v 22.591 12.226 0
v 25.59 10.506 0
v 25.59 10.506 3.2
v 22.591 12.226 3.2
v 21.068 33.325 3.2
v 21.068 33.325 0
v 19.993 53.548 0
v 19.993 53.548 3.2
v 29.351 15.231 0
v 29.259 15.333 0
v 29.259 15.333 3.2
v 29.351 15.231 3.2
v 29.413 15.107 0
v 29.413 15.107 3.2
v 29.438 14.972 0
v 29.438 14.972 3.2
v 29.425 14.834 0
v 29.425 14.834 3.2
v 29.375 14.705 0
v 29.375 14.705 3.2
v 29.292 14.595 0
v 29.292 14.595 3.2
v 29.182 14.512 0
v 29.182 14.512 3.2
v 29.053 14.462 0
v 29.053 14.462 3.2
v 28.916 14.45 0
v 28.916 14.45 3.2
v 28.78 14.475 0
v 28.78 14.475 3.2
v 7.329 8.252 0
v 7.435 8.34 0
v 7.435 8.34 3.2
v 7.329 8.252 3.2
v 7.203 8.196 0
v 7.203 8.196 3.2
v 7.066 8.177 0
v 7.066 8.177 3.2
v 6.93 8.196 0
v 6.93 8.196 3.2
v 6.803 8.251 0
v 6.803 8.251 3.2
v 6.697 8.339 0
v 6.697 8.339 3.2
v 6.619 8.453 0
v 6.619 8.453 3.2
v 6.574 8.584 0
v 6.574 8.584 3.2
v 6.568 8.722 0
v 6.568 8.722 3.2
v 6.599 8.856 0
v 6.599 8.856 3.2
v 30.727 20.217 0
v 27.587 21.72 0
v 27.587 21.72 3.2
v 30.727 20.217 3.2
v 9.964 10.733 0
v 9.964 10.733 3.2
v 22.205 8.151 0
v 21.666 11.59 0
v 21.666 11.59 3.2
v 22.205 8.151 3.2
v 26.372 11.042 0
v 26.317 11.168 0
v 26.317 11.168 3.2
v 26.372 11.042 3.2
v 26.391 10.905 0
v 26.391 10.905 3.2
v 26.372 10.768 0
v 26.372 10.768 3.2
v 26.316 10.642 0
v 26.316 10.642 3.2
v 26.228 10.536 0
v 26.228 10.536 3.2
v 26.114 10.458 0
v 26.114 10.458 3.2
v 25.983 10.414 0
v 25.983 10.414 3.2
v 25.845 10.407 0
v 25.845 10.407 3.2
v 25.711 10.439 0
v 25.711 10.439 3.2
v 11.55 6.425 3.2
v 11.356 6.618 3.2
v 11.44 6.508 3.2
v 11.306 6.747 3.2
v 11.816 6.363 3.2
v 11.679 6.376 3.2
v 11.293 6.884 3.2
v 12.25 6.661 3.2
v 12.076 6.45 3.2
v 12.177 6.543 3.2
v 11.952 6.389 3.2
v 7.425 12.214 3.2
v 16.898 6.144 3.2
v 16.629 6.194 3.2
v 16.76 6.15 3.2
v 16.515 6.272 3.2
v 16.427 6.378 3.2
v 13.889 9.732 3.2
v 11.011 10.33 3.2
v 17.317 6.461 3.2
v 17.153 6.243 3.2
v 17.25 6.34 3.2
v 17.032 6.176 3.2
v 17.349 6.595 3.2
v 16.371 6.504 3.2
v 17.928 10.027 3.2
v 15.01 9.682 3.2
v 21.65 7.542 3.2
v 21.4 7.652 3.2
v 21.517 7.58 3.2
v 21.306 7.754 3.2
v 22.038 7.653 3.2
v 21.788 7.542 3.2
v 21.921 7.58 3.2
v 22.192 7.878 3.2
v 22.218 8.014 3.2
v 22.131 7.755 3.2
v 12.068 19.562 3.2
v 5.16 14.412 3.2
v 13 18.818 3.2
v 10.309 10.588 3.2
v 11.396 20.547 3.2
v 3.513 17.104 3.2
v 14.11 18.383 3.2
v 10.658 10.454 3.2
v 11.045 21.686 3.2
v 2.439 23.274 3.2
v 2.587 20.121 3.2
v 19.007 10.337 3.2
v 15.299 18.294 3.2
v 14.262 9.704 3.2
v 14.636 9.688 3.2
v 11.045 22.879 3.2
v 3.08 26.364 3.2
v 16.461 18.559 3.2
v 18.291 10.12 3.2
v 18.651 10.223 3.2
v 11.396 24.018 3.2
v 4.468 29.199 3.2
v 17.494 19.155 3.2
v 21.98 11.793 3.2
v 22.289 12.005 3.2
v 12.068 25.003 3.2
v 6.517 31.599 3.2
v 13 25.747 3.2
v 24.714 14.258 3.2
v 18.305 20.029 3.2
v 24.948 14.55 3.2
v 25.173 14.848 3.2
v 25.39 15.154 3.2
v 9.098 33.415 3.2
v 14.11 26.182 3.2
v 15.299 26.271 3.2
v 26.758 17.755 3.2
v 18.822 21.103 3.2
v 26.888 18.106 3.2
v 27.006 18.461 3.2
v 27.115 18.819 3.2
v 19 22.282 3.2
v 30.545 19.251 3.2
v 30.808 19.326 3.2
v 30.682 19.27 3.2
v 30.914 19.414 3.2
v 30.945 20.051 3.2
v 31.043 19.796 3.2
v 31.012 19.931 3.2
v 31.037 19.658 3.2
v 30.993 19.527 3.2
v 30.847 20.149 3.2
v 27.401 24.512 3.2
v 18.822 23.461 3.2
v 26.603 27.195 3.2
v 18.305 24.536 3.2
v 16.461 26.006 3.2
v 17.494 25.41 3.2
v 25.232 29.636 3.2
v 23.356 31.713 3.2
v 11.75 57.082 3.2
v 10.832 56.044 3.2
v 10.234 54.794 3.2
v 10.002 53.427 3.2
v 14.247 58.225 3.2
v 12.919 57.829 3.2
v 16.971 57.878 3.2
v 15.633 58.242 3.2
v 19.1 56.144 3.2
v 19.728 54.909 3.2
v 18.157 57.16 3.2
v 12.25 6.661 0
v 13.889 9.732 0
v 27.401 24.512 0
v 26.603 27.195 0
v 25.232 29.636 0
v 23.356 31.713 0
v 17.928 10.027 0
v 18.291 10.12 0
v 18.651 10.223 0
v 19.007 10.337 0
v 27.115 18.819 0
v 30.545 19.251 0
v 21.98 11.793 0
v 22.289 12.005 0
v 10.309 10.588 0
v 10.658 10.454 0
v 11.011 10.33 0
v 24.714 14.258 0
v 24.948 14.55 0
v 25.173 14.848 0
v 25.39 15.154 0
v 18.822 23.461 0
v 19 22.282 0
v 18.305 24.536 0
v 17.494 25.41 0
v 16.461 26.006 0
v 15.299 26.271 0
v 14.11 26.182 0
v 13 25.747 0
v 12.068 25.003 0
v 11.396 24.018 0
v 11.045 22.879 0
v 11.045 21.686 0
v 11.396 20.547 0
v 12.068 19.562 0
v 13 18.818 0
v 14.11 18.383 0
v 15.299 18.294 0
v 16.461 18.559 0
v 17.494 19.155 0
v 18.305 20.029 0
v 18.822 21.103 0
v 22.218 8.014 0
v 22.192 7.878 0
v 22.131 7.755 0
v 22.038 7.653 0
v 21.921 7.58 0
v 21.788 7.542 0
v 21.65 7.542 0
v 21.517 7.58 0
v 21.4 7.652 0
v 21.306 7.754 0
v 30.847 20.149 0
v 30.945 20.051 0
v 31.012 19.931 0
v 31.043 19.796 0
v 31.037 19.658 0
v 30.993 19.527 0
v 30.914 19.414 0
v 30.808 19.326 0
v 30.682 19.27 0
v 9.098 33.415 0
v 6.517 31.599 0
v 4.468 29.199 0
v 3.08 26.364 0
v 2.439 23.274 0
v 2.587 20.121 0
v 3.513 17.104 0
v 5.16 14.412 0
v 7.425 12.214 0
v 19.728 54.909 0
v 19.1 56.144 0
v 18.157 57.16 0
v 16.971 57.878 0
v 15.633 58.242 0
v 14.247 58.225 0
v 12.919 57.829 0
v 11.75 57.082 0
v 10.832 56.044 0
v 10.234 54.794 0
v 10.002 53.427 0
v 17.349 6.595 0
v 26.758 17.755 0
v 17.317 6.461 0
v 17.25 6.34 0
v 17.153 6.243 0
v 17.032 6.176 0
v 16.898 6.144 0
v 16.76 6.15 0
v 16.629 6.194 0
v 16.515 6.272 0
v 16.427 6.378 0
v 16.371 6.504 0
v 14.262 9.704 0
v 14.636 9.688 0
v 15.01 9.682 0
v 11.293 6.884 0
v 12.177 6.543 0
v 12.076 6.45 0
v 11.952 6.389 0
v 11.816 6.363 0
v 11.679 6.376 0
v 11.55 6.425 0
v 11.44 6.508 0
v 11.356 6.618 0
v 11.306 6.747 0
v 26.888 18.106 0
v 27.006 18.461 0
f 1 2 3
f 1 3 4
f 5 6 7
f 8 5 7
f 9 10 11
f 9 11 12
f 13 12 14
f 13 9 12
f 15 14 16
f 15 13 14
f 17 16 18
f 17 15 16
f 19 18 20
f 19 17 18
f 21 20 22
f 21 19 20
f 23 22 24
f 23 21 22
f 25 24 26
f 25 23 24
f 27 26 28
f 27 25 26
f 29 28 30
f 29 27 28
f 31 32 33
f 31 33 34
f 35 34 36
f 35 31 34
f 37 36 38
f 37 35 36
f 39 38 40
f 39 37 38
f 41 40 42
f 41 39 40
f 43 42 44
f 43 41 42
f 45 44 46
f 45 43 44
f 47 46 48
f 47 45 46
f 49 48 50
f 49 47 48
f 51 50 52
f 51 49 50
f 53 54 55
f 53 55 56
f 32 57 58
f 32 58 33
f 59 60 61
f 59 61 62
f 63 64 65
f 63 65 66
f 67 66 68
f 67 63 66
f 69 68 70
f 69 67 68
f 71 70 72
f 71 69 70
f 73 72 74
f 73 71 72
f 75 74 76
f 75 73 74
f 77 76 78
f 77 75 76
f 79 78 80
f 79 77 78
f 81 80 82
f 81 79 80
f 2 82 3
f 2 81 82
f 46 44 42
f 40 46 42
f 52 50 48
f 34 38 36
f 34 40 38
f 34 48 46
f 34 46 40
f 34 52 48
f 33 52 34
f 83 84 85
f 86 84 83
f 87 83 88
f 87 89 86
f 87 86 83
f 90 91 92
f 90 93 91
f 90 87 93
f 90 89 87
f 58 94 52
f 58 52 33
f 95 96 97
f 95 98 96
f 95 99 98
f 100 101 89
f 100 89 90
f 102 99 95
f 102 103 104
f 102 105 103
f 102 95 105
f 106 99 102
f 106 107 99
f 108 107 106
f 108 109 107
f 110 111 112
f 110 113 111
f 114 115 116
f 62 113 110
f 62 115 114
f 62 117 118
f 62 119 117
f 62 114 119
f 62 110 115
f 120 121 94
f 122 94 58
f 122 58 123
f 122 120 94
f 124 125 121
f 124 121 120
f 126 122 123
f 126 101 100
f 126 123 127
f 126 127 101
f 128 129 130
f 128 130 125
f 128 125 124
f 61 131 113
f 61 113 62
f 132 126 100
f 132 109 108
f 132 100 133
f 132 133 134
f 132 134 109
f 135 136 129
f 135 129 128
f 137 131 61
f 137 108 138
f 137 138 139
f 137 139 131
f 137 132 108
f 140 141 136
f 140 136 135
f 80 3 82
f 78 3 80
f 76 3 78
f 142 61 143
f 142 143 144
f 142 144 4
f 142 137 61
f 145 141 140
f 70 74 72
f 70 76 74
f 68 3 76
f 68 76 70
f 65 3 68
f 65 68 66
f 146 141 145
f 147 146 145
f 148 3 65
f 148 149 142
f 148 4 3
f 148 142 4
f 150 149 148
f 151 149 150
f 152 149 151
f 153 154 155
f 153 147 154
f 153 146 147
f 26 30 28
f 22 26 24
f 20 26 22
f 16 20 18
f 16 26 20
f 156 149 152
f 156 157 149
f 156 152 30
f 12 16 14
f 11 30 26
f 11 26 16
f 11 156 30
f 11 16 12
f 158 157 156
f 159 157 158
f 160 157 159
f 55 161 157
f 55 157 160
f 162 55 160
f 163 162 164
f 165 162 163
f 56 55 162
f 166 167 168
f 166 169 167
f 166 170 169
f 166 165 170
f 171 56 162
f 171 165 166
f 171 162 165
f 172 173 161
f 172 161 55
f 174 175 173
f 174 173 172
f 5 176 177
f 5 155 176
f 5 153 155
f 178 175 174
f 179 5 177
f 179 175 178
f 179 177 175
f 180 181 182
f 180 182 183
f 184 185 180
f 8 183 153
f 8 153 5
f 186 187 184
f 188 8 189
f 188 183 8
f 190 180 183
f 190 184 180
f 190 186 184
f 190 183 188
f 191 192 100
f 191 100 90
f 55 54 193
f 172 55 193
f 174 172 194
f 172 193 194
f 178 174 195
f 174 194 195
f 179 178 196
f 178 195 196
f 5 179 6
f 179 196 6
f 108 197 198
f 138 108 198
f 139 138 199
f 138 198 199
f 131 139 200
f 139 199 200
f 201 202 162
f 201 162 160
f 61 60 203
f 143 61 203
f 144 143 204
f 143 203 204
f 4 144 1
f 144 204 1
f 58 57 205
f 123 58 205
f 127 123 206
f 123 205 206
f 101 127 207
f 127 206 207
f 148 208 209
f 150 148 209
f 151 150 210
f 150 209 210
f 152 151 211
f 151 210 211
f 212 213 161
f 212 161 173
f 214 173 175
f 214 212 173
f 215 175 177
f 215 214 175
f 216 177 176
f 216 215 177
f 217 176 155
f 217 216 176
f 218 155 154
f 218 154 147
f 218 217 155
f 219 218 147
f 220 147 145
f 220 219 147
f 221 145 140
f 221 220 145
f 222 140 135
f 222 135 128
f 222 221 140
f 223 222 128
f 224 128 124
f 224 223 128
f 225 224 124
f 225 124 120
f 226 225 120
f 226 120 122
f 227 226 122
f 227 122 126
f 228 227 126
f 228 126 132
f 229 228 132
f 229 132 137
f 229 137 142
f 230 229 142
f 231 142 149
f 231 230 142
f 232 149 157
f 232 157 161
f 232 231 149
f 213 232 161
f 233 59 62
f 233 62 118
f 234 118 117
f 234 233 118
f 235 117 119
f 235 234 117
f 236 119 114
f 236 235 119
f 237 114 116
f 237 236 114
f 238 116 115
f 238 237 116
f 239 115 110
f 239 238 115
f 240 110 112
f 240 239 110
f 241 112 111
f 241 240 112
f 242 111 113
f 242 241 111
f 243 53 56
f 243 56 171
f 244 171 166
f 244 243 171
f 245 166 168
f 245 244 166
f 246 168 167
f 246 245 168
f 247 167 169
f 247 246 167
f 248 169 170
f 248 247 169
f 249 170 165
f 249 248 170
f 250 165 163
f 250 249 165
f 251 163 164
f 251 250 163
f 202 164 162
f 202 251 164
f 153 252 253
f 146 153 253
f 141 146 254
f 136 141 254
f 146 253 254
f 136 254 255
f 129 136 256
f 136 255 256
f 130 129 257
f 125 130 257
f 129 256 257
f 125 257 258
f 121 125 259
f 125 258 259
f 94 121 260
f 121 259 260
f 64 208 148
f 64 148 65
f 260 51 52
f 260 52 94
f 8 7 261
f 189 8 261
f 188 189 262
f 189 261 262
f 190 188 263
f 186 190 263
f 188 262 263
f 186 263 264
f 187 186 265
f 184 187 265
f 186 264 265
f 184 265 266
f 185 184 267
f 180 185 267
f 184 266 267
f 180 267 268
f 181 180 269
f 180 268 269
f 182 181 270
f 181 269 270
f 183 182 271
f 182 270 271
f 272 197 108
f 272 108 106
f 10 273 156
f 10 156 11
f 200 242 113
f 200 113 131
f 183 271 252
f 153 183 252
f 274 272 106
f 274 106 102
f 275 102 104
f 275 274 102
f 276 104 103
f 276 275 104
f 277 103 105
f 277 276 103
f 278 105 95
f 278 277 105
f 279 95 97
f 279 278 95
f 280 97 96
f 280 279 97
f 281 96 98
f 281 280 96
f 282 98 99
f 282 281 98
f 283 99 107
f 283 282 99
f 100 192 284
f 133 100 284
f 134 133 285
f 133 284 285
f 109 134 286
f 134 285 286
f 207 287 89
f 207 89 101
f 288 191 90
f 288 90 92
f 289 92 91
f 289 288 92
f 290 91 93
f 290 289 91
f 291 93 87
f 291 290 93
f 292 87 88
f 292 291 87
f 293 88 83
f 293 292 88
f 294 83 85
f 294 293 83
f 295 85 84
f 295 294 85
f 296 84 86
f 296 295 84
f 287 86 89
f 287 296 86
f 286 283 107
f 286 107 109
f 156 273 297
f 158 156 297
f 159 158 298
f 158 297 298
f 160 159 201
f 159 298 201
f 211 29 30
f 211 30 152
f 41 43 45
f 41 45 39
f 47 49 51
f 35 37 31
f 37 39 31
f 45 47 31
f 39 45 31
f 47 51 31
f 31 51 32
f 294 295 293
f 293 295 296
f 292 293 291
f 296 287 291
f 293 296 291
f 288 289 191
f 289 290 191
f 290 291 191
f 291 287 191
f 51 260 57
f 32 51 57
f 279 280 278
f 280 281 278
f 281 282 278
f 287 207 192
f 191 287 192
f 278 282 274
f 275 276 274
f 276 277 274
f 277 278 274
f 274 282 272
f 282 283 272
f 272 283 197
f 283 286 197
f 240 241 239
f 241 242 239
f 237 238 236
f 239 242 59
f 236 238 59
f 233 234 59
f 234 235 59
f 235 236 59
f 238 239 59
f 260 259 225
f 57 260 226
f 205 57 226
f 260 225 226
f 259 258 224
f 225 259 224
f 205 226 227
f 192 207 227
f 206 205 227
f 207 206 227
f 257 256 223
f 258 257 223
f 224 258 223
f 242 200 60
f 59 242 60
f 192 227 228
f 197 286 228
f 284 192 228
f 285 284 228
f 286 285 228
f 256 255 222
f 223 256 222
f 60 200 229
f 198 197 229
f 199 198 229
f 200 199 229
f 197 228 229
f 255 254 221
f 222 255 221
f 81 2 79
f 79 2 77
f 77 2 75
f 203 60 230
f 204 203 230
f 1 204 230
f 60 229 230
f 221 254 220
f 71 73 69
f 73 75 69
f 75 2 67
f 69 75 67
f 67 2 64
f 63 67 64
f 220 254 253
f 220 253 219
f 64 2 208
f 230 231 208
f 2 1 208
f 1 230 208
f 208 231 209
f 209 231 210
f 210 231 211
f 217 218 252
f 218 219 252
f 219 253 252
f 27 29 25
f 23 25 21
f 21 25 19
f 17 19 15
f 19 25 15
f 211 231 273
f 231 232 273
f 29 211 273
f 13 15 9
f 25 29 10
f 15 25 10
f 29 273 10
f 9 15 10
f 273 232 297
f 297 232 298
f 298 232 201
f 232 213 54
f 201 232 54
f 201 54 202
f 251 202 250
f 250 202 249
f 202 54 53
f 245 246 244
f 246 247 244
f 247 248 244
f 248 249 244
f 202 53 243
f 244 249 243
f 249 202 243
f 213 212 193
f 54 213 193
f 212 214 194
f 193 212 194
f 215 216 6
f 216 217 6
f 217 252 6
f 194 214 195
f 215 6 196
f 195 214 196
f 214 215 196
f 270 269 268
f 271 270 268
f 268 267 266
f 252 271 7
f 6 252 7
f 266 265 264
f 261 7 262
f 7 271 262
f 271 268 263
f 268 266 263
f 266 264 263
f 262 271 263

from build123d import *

# Parameters (mm, degrees)
SKETCH4_R           = 4
BOSS_EXTRUDE4_DEPTH = 3.2
BOSS_EXTRUDE6_START = -3.2
BOSS_EXTRUDE6_DEPTH = 3.2
CIRPATTERN3_COUNT   = 7
CIRPATTERN3_ANGLE   = 111


with BuildPart() as part:
    # Sketch4 → Boss-Extrude4 (new body)
    with BuildSketch(Plane.XY):
        with BuildLine():
            Line((21.067900641, 33.325122256), (19.993019925, 53.547837419))
            ThreePointArc((19.993019925, 53.547837419), (14.939517656, 58.282084655), (10.002153079, 53.426838719))
            Line((10.002153079, 53.426838719), (9.098366441, 33.414868889))
            ThreePointArc((9.098366441, 33.414868889), (14.90552884, 9.682805465), (21.067900641, 33.325122256))
        make_face()
        with Locations((15, 22.282451301)):
            Circle(SKETCH4_R, mode=Mode.SUBTRACT)
    extrude(amount=BOSS_EXTRUDE4_DEPTH)

    # Sketch6 → Boss-Extrude6 (add)
    with BuildSketch(Plane.XY.offset(3.2).offset(BOSS_EXTRUDE6_START)):
        with BuildLine():
            Line((27.587419579, 21.71954071), (30.726886196, 20.216575064))
            ThreePointArc((30.726886196, 20.216575064), (31.03657327, 19.658315603), (30.545192773, 19.250755893))
            Line((30.545192773, 19.250755893), (27.114578574, 18.81878475))
            ThreePointArc((27.114578574, 18.81878475), (27.435866455, 20.255328827), (27.587419579, 21.71954071))
        make_face()
    boss_extrude6 = extrude(amount=BOSS_EXTRUDE6_DEPTH)

    # CirPattern3: Boss-Extrude6 ×7 about axis
    cirpattern3_axis = Axis((15, 22.282451301, 0), (0, 0, -1))
    for i in range(1, CIRPATTERN3_COUNT):
        add(boss_extrude6.rotate(cirpattern3_axis, i * CIRPATTERN3_ANGLE / (CIRPATTERN3_COUNT - 1)))


solid = part.part
